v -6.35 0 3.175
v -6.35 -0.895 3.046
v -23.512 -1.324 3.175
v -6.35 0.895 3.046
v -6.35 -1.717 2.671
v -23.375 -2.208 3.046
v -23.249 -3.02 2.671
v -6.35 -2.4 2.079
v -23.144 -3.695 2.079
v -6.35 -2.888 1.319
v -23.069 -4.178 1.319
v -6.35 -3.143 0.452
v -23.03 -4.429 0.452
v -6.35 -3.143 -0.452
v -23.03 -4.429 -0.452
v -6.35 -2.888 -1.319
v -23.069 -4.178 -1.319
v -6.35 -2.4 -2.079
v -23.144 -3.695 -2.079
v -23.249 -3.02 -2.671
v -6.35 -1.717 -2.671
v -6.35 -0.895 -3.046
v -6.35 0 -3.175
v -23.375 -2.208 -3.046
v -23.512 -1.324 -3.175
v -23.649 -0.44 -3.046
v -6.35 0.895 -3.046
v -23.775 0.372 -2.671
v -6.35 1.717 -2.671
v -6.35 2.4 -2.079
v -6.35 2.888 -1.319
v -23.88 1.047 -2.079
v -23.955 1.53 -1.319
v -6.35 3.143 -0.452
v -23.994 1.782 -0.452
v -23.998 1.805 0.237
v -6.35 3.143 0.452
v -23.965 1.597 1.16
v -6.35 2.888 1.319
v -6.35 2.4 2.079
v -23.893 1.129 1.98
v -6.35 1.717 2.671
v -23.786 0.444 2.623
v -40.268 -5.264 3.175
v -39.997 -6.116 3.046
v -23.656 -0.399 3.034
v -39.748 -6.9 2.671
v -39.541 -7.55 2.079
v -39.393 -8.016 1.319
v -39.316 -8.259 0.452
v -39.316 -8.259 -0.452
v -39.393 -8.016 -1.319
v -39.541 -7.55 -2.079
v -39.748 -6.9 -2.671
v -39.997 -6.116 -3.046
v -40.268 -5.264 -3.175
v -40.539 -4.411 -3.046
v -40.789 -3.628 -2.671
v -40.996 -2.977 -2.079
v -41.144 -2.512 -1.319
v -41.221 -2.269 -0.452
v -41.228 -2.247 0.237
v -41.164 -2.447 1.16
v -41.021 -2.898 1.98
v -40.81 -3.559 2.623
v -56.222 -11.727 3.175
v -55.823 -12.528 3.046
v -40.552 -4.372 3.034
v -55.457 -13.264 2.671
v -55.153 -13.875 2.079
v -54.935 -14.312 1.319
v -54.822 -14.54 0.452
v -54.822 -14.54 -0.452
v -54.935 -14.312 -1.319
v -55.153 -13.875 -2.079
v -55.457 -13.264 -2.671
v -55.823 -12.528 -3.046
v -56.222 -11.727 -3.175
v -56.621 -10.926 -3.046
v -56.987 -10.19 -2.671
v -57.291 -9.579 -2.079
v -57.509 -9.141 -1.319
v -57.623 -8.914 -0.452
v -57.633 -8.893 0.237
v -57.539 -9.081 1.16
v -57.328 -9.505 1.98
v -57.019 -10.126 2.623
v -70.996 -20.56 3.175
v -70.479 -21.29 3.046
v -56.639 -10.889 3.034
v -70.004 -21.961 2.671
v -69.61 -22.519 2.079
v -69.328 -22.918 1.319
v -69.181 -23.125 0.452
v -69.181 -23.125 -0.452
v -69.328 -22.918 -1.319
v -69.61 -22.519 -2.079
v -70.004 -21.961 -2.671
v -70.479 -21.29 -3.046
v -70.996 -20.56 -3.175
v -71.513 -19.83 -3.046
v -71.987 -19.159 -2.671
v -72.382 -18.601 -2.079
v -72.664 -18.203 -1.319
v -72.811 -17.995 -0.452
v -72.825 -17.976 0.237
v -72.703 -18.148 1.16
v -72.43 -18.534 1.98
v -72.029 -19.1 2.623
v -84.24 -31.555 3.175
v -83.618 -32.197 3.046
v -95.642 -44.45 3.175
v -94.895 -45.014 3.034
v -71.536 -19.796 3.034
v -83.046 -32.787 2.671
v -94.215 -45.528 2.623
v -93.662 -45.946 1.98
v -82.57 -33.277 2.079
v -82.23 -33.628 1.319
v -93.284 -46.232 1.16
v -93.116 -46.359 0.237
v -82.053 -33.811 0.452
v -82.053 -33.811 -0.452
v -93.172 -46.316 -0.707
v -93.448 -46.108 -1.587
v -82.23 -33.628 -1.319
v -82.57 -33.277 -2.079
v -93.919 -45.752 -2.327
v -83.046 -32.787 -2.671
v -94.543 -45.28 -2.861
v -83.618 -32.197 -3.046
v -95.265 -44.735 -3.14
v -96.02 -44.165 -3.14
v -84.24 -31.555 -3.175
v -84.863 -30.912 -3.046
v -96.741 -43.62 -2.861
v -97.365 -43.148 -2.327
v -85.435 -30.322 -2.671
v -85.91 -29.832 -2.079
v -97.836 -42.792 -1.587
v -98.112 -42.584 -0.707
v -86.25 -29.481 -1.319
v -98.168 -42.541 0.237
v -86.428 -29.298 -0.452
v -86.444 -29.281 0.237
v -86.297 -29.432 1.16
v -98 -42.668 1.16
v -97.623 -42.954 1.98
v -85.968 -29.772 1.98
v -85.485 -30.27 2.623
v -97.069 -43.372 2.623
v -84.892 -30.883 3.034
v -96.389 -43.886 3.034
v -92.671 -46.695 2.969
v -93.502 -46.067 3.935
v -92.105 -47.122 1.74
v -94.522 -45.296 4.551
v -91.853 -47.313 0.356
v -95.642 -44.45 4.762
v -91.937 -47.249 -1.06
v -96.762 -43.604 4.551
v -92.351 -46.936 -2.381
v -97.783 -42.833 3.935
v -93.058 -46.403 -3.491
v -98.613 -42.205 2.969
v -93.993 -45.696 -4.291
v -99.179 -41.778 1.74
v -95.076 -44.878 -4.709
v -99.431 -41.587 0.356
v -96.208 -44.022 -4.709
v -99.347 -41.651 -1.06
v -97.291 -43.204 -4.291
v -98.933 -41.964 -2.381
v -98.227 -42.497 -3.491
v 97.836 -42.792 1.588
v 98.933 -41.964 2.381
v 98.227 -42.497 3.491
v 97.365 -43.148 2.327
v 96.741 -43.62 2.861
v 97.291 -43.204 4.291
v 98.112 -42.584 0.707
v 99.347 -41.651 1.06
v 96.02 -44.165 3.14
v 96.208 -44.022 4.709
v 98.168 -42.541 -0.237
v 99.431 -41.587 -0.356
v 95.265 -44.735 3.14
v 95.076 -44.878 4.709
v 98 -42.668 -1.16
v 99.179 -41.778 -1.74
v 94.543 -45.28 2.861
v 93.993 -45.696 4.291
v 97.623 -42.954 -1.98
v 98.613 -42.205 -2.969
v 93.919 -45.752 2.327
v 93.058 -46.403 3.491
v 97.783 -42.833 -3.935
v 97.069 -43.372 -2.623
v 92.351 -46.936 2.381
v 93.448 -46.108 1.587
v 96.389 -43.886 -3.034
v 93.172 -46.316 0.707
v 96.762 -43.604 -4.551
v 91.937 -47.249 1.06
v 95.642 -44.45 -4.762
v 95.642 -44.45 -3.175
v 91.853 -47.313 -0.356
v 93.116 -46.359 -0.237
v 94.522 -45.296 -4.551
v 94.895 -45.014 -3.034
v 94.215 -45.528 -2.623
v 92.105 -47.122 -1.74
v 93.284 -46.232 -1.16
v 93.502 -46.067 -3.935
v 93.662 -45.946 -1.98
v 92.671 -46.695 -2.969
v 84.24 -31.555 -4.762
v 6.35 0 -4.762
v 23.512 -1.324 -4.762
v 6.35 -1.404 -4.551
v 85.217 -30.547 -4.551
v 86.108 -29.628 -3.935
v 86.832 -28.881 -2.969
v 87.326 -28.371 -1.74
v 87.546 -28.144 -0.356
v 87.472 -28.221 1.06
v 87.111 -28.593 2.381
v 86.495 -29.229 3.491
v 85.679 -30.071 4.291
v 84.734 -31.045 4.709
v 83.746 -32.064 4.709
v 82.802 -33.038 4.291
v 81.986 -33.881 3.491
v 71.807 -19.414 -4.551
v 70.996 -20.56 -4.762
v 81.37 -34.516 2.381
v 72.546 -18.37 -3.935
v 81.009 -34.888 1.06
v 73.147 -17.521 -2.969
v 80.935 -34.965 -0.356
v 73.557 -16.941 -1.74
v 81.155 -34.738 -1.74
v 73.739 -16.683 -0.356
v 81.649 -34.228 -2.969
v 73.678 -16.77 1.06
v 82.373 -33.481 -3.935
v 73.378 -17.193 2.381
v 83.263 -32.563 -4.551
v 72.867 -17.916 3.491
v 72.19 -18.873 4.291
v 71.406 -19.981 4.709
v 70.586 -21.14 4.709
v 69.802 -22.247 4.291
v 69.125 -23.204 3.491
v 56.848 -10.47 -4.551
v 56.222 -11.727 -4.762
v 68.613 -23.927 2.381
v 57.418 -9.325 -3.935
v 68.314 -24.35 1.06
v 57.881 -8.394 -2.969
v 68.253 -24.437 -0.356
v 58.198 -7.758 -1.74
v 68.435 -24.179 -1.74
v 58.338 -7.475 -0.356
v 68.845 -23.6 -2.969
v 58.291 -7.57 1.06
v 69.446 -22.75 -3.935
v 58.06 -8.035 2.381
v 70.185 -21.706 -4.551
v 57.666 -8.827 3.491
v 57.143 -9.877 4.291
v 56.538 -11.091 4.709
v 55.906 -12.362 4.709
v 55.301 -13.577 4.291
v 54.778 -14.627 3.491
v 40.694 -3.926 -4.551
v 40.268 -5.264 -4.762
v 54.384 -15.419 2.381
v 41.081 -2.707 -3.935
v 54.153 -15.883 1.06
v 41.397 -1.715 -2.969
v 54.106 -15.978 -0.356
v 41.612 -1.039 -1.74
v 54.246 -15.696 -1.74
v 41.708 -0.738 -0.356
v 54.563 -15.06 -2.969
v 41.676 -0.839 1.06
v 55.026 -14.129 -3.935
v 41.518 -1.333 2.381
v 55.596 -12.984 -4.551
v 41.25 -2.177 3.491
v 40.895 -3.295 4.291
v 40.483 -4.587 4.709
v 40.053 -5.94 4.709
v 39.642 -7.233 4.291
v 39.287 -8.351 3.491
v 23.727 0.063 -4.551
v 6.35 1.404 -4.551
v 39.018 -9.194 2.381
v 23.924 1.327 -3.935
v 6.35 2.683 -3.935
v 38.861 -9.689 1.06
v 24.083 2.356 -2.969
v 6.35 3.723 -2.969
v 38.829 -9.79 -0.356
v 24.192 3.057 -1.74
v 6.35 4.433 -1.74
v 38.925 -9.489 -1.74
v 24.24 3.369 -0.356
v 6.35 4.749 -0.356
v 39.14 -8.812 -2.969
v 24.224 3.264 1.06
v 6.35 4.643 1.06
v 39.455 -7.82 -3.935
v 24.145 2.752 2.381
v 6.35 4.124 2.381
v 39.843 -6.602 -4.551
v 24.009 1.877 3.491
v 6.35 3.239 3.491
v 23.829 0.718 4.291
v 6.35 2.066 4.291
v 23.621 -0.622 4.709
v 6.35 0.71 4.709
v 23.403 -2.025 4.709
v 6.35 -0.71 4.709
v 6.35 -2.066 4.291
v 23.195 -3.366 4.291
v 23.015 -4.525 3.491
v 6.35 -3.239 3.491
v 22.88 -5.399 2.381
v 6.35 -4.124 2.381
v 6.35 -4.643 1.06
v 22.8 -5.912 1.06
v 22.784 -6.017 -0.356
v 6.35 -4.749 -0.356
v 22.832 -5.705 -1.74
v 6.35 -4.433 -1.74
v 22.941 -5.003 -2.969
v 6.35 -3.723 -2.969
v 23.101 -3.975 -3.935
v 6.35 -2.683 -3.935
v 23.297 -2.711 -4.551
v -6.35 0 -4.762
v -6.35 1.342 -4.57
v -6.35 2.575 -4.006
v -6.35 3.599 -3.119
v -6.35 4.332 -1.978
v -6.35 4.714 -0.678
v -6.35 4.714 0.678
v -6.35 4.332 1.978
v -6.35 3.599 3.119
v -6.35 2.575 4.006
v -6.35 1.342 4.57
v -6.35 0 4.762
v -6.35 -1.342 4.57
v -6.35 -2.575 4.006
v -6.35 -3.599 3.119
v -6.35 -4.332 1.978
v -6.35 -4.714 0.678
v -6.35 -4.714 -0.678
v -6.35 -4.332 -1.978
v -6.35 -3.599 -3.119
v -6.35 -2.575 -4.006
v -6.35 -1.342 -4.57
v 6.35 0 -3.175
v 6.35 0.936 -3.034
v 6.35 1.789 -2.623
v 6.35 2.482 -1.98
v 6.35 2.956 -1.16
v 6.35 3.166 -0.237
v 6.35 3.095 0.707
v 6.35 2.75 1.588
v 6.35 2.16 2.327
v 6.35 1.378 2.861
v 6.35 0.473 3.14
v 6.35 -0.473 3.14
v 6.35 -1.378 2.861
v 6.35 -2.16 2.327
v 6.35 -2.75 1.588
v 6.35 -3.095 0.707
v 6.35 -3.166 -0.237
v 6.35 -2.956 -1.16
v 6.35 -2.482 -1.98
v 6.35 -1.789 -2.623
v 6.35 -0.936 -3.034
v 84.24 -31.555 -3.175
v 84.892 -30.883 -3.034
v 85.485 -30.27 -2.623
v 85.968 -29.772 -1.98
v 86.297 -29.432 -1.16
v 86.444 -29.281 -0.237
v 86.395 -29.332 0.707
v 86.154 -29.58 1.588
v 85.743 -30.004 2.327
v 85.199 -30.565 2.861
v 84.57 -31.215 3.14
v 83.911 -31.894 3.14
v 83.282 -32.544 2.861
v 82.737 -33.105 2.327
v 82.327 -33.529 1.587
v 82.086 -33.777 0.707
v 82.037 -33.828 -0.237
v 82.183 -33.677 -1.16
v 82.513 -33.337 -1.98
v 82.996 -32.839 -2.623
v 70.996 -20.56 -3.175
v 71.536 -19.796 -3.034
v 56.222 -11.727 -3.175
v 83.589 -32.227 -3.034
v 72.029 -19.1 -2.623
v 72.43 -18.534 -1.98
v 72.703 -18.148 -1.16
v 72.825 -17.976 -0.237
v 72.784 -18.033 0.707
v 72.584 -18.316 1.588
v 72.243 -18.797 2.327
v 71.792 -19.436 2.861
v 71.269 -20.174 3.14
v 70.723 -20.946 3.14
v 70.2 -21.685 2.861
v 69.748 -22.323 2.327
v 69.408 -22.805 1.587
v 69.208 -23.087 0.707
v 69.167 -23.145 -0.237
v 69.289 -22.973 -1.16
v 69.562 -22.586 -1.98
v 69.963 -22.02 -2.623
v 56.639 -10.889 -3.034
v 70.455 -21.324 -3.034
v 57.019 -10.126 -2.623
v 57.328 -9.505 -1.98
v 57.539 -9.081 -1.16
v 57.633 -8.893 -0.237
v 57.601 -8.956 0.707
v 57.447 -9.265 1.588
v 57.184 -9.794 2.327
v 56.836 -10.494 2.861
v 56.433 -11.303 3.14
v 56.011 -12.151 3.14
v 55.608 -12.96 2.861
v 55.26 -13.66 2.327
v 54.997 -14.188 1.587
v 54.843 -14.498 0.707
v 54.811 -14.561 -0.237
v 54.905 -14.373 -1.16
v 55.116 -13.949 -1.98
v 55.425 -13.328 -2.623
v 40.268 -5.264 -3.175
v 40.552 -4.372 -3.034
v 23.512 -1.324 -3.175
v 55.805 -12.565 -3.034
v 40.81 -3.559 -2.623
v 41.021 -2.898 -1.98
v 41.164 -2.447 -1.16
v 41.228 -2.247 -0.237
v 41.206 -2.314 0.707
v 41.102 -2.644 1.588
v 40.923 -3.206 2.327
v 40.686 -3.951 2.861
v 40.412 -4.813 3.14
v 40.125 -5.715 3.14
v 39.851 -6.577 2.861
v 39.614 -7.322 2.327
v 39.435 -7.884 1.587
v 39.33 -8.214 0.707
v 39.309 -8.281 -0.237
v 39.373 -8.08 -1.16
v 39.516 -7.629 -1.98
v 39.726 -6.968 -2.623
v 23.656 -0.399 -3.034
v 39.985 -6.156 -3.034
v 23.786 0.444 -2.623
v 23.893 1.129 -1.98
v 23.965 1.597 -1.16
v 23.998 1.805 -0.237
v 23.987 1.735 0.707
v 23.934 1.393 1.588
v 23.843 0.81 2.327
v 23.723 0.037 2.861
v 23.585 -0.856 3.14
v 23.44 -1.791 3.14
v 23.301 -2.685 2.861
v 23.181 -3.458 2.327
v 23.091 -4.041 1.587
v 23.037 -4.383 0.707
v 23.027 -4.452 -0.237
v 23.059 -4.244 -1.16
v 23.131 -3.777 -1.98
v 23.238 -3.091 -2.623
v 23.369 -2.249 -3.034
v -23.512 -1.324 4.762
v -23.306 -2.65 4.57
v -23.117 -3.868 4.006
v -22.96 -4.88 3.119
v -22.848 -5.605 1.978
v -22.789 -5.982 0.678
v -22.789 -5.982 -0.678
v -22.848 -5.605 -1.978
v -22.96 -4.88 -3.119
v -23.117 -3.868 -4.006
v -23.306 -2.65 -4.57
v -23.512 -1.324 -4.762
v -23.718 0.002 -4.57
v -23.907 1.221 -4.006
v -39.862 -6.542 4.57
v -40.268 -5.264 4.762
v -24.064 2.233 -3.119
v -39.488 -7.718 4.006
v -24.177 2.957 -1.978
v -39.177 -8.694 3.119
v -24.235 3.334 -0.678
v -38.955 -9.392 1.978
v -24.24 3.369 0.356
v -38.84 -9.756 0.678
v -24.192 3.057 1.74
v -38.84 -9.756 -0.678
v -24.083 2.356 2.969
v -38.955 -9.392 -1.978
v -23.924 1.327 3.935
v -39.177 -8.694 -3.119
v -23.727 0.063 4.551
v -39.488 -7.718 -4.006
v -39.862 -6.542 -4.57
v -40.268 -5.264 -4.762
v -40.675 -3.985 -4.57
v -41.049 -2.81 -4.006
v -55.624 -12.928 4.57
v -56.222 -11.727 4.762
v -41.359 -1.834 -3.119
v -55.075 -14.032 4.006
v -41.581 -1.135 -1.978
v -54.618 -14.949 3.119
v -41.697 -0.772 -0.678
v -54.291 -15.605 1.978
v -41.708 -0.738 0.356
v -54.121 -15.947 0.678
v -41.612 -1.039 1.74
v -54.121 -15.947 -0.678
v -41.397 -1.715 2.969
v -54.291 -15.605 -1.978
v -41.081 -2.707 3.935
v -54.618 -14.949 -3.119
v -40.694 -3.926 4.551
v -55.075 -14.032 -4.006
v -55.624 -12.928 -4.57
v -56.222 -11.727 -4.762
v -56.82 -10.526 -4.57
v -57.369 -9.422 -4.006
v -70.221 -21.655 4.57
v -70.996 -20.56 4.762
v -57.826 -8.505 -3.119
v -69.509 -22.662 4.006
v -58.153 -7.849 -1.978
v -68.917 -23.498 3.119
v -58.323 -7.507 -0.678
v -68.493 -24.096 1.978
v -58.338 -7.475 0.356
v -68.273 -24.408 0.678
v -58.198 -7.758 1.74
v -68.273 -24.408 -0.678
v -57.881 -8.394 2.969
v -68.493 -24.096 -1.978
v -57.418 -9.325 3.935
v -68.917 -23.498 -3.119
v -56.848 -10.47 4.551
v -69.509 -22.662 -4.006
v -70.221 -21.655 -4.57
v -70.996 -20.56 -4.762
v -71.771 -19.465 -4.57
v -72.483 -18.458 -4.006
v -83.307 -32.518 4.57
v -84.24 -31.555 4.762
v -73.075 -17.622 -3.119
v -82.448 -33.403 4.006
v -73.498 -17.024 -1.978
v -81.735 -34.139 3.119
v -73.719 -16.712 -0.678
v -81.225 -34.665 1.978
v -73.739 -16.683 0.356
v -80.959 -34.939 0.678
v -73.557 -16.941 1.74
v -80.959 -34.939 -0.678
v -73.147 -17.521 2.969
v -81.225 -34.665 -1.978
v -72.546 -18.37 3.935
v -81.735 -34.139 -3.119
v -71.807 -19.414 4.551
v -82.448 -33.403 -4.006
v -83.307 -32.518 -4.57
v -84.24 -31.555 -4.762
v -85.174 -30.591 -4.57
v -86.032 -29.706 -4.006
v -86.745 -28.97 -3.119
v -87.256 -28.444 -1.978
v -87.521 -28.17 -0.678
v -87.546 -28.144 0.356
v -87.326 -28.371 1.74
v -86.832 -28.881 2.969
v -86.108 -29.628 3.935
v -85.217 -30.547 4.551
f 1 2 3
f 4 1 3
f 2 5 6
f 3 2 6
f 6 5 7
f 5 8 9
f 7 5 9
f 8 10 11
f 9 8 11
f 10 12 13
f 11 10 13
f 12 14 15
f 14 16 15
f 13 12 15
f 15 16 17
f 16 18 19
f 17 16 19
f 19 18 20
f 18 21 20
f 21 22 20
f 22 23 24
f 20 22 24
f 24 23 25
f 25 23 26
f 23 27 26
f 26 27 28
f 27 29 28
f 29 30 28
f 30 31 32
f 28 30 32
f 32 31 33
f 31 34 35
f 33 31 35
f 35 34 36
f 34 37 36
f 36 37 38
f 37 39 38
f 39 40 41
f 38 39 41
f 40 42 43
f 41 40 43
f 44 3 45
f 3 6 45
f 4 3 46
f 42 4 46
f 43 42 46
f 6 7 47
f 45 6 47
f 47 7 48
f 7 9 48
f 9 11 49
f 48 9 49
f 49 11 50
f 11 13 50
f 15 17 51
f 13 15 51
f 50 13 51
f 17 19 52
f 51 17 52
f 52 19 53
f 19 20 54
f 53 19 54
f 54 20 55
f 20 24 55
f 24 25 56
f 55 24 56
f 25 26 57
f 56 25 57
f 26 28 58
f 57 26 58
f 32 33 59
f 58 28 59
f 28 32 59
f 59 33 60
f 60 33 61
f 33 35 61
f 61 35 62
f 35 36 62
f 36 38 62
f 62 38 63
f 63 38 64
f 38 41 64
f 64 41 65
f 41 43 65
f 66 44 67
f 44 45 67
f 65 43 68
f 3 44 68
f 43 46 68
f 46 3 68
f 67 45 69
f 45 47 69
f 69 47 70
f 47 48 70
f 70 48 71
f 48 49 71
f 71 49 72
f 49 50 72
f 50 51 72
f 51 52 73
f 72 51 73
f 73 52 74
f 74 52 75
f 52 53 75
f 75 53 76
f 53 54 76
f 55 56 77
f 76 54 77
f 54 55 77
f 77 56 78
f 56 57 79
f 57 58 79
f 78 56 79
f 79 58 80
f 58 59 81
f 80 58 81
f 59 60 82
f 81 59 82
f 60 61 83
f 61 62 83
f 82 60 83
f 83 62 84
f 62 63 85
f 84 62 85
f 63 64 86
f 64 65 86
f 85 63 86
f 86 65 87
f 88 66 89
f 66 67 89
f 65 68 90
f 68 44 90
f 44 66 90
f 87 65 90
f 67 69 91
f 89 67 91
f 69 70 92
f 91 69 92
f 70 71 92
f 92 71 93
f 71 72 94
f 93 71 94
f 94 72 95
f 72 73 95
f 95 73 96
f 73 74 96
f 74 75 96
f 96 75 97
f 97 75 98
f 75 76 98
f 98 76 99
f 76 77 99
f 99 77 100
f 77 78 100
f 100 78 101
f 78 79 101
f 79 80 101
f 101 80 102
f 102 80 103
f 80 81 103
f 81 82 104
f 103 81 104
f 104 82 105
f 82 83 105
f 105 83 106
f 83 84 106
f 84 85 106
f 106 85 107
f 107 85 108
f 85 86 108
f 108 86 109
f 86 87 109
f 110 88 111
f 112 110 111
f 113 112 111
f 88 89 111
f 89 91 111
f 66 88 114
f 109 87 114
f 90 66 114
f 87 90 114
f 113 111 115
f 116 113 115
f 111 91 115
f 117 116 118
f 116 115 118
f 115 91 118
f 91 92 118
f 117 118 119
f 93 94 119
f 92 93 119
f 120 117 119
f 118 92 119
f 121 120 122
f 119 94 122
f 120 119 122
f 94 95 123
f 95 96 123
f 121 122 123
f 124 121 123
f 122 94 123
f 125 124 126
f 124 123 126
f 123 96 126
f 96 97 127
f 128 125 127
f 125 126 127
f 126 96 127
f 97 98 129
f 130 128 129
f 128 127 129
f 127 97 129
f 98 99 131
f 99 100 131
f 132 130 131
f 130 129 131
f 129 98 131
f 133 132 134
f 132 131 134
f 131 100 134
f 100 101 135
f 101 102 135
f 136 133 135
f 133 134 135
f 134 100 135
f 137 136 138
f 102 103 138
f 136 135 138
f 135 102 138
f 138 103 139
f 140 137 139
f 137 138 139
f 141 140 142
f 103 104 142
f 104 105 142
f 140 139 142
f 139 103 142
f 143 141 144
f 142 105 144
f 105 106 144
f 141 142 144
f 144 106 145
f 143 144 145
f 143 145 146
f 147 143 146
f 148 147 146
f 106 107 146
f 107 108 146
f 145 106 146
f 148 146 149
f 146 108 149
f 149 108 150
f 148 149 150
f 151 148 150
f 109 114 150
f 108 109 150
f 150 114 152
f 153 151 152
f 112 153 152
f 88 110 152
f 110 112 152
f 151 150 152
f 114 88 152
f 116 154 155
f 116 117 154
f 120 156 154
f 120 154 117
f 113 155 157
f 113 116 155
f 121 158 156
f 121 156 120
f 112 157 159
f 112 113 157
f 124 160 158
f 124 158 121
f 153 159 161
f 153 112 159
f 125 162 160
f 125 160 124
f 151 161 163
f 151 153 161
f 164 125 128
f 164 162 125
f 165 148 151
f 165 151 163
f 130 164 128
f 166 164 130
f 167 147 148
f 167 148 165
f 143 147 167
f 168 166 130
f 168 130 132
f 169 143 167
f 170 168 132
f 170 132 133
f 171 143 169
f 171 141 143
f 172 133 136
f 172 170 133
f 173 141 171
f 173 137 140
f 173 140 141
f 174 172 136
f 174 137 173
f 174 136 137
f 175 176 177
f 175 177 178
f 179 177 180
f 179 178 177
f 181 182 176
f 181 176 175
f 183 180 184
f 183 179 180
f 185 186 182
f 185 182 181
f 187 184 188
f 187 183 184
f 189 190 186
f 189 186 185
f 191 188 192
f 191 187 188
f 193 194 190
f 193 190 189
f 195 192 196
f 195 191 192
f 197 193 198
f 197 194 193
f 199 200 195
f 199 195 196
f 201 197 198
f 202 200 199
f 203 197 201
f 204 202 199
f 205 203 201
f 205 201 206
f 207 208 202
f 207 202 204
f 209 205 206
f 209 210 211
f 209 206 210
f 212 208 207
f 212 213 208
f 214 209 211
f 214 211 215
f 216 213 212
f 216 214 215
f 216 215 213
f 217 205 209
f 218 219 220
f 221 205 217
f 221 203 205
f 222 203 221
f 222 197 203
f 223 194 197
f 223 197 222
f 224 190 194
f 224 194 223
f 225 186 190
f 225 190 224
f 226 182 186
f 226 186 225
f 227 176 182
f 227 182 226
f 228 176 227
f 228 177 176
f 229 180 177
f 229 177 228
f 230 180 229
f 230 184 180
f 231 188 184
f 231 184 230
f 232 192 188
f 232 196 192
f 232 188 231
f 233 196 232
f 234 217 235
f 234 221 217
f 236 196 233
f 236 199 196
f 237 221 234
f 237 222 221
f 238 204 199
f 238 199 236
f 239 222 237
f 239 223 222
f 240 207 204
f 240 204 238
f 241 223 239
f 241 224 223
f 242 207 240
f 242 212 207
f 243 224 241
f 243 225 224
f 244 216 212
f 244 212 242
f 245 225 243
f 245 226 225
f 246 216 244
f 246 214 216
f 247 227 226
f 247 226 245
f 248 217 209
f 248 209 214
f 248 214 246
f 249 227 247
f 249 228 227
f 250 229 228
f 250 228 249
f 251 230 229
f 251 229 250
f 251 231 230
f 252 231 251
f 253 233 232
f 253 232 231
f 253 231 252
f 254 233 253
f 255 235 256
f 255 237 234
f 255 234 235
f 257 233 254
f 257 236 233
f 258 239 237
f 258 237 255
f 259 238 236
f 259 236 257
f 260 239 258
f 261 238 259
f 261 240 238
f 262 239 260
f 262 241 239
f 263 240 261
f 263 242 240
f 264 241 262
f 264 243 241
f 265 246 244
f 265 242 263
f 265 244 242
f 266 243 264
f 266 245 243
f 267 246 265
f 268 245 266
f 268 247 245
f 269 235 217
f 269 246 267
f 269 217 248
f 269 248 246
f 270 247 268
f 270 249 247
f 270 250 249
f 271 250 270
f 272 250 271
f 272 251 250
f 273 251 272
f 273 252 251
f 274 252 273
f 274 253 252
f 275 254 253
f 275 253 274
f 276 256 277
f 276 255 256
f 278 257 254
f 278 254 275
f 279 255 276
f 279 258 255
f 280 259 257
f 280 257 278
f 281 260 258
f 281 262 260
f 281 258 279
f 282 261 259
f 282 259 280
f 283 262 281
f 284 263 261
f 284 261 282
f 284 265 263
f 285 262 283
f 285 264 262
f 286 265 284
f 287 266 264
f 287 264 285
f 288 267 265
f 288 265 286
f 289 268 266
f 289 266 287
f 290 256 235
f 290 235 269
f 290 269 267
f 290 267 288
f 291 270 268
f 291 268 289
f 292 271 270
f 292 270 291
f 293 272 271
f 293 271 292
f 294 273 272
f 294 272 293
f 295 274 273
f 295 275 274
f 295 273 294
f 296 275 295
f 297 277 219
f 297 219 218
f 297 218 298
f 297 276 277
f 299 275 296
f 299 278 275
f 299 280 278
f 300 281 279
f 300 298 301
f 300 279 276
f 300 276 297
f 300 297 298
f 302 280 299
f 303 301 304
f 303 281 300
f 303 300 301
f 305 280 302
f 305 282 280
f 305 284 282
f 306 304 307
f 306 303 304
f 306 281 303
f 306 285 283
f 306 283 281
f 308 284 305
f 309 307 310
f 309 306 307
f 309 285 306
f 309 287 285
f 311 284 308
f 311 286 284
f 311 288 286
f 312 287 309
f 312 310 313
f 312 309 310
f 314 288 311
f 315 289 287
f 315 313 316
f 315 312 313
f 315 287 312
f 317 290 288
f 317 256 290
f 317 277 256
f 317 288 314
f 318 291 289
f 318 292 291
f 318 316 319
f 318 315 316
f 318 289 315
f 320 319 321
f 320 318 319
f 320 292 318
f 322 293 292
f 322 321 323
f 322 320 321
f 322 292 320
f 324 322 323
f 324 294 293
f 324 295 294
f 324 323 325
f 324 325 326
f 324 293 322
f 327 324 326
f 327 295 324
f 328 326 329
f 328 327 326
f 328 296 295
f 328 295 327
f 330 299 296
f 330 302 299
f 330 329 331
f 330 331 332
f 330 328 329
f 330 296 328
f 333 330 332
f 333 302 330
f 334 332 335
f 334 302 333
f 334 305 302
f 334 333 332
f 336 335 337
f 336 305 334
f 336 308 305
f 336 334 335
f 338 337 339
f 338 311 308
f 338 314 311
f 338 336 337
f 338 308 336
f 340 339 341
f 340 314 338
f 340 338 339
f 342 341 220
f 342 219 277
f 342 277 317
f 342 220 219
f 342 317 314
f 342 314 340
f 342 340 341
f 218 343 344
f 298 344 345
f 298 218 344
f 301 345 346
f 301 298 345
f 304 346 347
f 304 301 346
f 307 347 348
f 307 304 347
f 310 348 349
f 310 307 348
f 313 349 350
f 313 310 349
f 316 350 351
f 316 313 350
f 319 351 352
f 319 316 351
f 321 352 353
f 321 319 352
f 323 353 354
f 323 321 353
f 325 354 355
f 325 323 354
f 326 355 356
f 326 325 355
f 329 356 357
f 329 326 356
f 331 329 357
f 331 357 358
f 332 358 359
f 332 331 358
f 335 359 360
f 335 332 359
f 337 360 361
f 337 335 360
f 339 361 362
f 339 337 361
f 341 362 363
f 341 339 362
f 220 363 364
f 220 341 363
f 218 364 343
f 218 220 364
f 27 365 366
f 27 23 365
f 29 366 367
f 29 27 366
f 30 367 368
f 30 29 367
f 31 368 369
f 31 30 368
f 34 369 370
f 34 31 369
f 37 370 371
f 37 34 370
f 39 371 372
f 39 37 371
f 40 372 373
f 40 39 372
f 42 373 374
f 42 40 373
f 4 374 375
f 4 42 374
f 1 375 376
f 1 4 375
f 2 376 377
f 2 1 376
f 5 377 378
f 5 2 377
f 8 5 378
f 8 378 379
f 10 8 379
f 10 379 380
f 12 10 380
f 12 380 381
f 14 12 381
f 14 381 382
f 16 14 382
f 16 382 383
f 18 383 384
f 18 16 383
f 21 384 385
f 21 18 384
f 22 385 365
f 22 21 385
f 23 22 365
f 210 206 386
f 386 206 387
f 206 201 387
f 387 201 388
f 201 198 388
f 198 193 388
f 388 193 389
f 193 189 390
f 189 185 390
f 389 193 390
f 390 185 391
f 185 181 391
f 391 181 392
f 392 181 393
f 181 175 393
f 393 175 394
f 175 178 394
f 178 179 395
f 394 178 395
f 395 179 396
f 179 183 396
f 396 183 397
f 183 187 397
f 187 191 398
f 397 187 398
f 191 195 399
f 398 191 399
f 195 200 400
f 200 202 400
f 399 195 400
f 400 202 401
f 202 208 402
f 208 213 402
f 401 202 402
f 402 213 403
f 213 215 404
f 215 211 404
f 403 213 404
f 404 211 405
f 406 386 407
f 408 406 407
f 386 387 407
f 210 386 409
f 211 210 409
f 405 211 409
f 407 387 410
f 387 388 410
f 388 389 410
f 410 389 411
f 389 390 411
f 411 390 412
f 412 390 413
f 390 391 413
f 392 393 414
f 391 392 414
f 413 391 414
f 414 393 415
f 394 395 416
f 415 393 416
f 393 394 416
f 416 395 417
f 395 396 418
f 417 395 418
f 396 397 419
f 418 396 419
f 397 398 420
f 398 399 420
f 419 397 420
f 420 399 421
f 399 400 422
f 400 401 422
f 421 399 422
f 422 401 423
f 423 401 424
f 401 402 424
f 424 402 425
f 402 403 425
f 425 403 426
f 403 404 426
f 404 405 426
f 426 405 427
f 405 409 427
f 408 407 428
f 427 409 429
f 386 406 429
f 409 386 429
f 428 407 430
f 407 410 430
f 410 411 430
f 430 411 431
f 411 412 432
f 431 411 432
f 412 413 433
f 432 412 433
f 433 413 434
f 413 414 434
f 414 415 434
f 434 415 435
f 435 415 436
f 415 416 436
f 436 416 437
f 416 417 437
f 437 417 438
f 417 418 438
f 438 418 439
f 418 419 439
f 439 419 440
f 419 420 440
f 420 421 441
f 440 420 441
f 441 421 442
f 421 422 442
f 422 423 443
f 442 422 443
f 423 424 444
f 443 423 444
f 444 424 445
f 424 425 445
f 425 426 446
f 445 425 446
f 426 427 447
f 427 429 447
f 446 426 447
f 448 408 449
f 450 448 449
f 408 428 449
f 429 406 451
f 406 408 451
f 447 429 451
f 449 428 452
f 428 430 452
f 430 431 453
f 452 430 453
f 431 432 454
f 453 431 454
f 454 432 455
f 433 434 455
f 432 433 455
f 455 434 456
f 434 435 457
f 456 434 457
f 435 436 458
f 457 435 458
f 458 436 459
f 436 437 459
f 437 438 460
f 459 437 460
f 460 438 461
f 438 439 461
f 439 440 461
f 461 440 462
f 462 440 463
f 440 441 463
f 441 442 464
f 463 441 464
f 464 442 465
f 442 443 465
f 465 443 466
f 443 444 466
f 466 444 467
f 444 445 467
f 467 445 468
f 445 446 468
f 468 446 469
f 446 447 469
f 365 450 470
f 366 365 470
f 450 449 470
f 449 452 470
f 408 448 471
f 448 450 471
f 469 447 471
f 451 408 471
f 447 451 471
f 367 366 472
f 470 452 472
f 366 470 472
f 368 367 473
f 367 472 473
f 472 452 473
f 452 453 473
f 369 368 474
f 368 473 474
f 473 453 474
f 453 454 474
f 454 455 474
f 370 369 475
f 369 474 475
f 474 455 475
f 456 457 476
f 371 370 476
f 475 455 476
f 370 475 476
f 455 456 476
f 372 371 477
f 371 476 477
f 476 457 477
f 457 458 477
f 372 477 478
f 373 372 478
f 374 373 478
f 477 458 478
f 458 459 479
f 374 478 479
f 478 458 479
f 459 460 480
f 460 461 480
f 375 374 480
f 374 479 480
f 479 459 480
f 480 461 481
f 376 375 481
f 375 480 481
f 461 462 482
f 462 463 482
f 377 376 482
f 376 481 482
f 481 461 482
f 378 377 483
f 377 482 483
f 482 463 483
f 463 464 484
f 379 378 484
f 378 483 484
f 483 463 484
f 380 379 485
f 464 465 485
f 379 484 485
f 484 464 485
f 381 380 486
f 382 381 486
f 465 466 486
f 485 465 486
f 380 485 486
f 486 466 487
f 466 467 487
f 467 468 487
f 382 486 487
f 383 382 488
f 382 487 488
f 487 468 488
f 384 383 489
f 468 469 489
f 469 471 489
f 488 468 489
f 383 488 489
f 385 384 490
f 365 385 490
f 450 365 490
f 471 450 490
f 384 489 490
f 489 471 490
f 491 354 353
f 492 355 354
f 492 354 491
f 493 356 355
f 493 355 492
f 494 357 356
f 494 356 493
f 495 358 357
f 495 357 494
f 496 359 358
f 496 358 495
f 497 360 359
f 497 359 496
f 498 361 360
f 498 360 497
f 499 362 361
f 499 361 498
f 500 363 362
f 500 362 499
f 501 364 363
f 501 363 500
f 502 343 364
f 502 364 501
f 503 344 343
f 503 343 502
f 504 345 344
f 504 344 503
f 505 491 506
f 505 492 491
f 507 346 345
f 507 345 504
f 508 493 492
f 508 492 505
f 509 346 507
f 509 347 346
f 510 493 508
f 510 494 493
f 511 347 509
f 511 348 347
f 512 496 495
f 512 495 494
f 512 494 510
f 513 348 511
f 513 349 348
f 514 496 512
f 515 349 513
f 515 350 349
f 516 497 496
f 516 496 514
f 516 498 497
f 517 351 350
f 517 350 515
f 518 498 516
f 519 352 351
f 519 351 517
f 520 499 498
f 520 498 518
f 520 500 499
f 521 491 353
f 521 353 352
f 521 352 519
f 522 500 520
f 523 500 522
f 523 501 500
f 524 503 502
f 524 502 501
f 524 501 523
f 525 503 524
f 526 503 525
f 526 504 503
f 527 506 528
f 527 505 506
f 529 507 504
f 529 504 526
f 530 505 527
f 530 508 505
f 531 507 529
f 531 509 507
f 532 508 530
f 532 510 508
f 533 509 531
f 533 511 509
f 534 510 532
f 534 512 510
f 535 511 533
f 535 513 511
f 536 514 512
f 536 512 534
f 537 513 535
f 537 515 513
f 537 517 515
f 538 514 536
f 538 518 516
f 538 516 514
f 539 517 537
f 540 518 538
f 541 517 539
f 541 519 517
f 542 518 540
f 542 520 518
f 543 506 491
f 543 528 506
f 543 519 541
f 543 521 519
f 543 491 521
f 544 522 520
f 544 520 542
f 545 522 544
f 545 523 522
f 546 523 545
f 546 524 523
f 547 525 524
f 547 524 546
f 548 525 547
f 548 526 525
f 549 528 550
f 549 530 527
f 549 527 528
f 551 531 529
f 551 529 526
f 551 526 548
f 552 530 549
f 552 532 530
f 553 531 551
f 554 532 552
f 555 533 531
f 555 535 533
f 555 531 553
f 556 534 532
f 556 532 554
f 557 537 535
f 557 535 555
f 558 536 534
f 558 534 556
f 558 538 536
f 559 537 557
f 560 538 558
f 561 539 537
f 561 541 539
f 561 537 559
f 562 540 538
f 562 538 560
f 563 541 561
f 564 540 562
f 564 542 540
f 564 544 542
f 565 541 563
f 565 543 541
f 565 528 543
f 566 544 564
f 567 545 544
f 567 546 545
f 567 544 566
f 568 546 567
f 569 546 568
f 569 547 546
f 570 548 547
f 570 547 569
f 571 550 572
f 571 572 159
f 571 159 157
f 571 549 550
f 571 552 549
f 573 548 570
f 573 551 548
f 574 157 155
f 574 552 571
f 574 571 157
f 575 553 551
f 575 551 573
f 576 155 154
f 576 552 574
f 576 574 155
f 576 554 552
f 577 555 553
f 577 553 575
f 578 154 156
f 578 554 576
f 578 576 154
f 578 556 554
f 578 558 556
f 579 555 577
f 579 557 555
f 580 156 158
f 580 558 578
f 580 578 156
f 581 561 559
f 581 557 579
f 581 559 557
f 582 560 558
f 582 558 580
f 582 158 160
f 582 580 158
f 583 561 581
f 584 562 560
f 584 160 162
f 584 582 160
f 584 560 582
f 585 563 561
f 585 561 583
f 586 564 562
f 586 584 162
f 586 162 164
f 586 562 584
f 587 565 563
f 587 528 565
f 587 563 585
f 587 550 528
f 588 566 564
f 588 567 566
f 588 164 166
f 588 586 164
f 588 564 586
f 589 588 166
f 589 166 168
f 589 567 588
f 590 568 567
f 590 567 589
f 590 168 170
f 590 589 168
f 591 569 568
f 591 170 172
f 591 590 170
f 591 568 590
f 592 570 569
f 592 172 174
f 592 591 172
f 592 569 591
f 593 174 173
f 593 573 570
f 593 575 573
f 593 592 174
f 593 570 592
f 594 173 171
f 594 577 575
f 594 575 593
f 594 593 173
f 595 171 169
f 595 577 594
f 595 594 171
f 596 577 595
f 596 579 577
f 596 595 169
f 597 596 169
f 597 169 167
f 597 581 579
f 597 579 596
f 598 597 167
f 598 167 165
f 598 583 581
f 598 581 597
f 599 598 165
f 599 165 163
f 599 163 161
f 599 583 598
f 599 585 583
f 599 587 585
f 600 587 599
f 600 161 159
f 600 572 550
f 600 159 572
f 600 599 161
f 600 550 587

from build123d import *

# Parameters (mm, degrees)
SKETCH1_R      = 4.7625
SKETCH1_R_2    = 3.175
EXTRUDE1_DEPTH = 6.35
SKETCH3_R      = 4.7625
SKETCH3_R_2    = 3.175
SKETCH5_R      = 4.7625
SKETCH5_R_2    = 3.175


with BuildPart() as part:
    # Sketch1 → Extrude1 (new, symmetric)
    with BuildSketch(Plane(origin=(0, 0, 0), x_dir=(0, 0, -1), z_dir=(1, 0, 0))):
        Circle(SKETCH1_R)
        Circle(SKETCH1_R_2, mode=Mode.SUBTRACT)
    extrude(amount=EXTRUDE1_DEPTH, both=True)

    # Sweep1: sweep along a path in Sketch6
    with BuildLine(Plane.XY) as sweep1_path:
        ThreePointArc((-6.35, 0), (-56.222049707, -11.726919872), (-95.642120974, -44.45))
    # Sketch3 → Sweep1 (sweep)
    with BuildSketch(Plane.ZY.offset(6.35)):
        Circle(SKETCH3_R)
        Circle(SKETCH3_R_2, mode=Mode.SUBTRACT)
    sweep(path=sweep1_path.line)

    # Sweep2: sweep along a path in Sketch4
    with BuildLine(Plane.XY) as sweep2_path:
        ThreePointArc((95.642120974, -44.45), (56.222049707, -11.726919872), (6.35, 0))
    # Sketch5 → Sweep2 (sweep)
    with BuildSketch(Plane(origin=(6.35, 0, 0), x_dir=(0, 0, -1), z_dir=(1, 0, 0))):
        Circle(SKETCH5_R)
        Circle(SKETCH5_R_2, mode=Mode.SUBTRACT)
    sweep(path=sweep2_path.line)


solid = part.part
